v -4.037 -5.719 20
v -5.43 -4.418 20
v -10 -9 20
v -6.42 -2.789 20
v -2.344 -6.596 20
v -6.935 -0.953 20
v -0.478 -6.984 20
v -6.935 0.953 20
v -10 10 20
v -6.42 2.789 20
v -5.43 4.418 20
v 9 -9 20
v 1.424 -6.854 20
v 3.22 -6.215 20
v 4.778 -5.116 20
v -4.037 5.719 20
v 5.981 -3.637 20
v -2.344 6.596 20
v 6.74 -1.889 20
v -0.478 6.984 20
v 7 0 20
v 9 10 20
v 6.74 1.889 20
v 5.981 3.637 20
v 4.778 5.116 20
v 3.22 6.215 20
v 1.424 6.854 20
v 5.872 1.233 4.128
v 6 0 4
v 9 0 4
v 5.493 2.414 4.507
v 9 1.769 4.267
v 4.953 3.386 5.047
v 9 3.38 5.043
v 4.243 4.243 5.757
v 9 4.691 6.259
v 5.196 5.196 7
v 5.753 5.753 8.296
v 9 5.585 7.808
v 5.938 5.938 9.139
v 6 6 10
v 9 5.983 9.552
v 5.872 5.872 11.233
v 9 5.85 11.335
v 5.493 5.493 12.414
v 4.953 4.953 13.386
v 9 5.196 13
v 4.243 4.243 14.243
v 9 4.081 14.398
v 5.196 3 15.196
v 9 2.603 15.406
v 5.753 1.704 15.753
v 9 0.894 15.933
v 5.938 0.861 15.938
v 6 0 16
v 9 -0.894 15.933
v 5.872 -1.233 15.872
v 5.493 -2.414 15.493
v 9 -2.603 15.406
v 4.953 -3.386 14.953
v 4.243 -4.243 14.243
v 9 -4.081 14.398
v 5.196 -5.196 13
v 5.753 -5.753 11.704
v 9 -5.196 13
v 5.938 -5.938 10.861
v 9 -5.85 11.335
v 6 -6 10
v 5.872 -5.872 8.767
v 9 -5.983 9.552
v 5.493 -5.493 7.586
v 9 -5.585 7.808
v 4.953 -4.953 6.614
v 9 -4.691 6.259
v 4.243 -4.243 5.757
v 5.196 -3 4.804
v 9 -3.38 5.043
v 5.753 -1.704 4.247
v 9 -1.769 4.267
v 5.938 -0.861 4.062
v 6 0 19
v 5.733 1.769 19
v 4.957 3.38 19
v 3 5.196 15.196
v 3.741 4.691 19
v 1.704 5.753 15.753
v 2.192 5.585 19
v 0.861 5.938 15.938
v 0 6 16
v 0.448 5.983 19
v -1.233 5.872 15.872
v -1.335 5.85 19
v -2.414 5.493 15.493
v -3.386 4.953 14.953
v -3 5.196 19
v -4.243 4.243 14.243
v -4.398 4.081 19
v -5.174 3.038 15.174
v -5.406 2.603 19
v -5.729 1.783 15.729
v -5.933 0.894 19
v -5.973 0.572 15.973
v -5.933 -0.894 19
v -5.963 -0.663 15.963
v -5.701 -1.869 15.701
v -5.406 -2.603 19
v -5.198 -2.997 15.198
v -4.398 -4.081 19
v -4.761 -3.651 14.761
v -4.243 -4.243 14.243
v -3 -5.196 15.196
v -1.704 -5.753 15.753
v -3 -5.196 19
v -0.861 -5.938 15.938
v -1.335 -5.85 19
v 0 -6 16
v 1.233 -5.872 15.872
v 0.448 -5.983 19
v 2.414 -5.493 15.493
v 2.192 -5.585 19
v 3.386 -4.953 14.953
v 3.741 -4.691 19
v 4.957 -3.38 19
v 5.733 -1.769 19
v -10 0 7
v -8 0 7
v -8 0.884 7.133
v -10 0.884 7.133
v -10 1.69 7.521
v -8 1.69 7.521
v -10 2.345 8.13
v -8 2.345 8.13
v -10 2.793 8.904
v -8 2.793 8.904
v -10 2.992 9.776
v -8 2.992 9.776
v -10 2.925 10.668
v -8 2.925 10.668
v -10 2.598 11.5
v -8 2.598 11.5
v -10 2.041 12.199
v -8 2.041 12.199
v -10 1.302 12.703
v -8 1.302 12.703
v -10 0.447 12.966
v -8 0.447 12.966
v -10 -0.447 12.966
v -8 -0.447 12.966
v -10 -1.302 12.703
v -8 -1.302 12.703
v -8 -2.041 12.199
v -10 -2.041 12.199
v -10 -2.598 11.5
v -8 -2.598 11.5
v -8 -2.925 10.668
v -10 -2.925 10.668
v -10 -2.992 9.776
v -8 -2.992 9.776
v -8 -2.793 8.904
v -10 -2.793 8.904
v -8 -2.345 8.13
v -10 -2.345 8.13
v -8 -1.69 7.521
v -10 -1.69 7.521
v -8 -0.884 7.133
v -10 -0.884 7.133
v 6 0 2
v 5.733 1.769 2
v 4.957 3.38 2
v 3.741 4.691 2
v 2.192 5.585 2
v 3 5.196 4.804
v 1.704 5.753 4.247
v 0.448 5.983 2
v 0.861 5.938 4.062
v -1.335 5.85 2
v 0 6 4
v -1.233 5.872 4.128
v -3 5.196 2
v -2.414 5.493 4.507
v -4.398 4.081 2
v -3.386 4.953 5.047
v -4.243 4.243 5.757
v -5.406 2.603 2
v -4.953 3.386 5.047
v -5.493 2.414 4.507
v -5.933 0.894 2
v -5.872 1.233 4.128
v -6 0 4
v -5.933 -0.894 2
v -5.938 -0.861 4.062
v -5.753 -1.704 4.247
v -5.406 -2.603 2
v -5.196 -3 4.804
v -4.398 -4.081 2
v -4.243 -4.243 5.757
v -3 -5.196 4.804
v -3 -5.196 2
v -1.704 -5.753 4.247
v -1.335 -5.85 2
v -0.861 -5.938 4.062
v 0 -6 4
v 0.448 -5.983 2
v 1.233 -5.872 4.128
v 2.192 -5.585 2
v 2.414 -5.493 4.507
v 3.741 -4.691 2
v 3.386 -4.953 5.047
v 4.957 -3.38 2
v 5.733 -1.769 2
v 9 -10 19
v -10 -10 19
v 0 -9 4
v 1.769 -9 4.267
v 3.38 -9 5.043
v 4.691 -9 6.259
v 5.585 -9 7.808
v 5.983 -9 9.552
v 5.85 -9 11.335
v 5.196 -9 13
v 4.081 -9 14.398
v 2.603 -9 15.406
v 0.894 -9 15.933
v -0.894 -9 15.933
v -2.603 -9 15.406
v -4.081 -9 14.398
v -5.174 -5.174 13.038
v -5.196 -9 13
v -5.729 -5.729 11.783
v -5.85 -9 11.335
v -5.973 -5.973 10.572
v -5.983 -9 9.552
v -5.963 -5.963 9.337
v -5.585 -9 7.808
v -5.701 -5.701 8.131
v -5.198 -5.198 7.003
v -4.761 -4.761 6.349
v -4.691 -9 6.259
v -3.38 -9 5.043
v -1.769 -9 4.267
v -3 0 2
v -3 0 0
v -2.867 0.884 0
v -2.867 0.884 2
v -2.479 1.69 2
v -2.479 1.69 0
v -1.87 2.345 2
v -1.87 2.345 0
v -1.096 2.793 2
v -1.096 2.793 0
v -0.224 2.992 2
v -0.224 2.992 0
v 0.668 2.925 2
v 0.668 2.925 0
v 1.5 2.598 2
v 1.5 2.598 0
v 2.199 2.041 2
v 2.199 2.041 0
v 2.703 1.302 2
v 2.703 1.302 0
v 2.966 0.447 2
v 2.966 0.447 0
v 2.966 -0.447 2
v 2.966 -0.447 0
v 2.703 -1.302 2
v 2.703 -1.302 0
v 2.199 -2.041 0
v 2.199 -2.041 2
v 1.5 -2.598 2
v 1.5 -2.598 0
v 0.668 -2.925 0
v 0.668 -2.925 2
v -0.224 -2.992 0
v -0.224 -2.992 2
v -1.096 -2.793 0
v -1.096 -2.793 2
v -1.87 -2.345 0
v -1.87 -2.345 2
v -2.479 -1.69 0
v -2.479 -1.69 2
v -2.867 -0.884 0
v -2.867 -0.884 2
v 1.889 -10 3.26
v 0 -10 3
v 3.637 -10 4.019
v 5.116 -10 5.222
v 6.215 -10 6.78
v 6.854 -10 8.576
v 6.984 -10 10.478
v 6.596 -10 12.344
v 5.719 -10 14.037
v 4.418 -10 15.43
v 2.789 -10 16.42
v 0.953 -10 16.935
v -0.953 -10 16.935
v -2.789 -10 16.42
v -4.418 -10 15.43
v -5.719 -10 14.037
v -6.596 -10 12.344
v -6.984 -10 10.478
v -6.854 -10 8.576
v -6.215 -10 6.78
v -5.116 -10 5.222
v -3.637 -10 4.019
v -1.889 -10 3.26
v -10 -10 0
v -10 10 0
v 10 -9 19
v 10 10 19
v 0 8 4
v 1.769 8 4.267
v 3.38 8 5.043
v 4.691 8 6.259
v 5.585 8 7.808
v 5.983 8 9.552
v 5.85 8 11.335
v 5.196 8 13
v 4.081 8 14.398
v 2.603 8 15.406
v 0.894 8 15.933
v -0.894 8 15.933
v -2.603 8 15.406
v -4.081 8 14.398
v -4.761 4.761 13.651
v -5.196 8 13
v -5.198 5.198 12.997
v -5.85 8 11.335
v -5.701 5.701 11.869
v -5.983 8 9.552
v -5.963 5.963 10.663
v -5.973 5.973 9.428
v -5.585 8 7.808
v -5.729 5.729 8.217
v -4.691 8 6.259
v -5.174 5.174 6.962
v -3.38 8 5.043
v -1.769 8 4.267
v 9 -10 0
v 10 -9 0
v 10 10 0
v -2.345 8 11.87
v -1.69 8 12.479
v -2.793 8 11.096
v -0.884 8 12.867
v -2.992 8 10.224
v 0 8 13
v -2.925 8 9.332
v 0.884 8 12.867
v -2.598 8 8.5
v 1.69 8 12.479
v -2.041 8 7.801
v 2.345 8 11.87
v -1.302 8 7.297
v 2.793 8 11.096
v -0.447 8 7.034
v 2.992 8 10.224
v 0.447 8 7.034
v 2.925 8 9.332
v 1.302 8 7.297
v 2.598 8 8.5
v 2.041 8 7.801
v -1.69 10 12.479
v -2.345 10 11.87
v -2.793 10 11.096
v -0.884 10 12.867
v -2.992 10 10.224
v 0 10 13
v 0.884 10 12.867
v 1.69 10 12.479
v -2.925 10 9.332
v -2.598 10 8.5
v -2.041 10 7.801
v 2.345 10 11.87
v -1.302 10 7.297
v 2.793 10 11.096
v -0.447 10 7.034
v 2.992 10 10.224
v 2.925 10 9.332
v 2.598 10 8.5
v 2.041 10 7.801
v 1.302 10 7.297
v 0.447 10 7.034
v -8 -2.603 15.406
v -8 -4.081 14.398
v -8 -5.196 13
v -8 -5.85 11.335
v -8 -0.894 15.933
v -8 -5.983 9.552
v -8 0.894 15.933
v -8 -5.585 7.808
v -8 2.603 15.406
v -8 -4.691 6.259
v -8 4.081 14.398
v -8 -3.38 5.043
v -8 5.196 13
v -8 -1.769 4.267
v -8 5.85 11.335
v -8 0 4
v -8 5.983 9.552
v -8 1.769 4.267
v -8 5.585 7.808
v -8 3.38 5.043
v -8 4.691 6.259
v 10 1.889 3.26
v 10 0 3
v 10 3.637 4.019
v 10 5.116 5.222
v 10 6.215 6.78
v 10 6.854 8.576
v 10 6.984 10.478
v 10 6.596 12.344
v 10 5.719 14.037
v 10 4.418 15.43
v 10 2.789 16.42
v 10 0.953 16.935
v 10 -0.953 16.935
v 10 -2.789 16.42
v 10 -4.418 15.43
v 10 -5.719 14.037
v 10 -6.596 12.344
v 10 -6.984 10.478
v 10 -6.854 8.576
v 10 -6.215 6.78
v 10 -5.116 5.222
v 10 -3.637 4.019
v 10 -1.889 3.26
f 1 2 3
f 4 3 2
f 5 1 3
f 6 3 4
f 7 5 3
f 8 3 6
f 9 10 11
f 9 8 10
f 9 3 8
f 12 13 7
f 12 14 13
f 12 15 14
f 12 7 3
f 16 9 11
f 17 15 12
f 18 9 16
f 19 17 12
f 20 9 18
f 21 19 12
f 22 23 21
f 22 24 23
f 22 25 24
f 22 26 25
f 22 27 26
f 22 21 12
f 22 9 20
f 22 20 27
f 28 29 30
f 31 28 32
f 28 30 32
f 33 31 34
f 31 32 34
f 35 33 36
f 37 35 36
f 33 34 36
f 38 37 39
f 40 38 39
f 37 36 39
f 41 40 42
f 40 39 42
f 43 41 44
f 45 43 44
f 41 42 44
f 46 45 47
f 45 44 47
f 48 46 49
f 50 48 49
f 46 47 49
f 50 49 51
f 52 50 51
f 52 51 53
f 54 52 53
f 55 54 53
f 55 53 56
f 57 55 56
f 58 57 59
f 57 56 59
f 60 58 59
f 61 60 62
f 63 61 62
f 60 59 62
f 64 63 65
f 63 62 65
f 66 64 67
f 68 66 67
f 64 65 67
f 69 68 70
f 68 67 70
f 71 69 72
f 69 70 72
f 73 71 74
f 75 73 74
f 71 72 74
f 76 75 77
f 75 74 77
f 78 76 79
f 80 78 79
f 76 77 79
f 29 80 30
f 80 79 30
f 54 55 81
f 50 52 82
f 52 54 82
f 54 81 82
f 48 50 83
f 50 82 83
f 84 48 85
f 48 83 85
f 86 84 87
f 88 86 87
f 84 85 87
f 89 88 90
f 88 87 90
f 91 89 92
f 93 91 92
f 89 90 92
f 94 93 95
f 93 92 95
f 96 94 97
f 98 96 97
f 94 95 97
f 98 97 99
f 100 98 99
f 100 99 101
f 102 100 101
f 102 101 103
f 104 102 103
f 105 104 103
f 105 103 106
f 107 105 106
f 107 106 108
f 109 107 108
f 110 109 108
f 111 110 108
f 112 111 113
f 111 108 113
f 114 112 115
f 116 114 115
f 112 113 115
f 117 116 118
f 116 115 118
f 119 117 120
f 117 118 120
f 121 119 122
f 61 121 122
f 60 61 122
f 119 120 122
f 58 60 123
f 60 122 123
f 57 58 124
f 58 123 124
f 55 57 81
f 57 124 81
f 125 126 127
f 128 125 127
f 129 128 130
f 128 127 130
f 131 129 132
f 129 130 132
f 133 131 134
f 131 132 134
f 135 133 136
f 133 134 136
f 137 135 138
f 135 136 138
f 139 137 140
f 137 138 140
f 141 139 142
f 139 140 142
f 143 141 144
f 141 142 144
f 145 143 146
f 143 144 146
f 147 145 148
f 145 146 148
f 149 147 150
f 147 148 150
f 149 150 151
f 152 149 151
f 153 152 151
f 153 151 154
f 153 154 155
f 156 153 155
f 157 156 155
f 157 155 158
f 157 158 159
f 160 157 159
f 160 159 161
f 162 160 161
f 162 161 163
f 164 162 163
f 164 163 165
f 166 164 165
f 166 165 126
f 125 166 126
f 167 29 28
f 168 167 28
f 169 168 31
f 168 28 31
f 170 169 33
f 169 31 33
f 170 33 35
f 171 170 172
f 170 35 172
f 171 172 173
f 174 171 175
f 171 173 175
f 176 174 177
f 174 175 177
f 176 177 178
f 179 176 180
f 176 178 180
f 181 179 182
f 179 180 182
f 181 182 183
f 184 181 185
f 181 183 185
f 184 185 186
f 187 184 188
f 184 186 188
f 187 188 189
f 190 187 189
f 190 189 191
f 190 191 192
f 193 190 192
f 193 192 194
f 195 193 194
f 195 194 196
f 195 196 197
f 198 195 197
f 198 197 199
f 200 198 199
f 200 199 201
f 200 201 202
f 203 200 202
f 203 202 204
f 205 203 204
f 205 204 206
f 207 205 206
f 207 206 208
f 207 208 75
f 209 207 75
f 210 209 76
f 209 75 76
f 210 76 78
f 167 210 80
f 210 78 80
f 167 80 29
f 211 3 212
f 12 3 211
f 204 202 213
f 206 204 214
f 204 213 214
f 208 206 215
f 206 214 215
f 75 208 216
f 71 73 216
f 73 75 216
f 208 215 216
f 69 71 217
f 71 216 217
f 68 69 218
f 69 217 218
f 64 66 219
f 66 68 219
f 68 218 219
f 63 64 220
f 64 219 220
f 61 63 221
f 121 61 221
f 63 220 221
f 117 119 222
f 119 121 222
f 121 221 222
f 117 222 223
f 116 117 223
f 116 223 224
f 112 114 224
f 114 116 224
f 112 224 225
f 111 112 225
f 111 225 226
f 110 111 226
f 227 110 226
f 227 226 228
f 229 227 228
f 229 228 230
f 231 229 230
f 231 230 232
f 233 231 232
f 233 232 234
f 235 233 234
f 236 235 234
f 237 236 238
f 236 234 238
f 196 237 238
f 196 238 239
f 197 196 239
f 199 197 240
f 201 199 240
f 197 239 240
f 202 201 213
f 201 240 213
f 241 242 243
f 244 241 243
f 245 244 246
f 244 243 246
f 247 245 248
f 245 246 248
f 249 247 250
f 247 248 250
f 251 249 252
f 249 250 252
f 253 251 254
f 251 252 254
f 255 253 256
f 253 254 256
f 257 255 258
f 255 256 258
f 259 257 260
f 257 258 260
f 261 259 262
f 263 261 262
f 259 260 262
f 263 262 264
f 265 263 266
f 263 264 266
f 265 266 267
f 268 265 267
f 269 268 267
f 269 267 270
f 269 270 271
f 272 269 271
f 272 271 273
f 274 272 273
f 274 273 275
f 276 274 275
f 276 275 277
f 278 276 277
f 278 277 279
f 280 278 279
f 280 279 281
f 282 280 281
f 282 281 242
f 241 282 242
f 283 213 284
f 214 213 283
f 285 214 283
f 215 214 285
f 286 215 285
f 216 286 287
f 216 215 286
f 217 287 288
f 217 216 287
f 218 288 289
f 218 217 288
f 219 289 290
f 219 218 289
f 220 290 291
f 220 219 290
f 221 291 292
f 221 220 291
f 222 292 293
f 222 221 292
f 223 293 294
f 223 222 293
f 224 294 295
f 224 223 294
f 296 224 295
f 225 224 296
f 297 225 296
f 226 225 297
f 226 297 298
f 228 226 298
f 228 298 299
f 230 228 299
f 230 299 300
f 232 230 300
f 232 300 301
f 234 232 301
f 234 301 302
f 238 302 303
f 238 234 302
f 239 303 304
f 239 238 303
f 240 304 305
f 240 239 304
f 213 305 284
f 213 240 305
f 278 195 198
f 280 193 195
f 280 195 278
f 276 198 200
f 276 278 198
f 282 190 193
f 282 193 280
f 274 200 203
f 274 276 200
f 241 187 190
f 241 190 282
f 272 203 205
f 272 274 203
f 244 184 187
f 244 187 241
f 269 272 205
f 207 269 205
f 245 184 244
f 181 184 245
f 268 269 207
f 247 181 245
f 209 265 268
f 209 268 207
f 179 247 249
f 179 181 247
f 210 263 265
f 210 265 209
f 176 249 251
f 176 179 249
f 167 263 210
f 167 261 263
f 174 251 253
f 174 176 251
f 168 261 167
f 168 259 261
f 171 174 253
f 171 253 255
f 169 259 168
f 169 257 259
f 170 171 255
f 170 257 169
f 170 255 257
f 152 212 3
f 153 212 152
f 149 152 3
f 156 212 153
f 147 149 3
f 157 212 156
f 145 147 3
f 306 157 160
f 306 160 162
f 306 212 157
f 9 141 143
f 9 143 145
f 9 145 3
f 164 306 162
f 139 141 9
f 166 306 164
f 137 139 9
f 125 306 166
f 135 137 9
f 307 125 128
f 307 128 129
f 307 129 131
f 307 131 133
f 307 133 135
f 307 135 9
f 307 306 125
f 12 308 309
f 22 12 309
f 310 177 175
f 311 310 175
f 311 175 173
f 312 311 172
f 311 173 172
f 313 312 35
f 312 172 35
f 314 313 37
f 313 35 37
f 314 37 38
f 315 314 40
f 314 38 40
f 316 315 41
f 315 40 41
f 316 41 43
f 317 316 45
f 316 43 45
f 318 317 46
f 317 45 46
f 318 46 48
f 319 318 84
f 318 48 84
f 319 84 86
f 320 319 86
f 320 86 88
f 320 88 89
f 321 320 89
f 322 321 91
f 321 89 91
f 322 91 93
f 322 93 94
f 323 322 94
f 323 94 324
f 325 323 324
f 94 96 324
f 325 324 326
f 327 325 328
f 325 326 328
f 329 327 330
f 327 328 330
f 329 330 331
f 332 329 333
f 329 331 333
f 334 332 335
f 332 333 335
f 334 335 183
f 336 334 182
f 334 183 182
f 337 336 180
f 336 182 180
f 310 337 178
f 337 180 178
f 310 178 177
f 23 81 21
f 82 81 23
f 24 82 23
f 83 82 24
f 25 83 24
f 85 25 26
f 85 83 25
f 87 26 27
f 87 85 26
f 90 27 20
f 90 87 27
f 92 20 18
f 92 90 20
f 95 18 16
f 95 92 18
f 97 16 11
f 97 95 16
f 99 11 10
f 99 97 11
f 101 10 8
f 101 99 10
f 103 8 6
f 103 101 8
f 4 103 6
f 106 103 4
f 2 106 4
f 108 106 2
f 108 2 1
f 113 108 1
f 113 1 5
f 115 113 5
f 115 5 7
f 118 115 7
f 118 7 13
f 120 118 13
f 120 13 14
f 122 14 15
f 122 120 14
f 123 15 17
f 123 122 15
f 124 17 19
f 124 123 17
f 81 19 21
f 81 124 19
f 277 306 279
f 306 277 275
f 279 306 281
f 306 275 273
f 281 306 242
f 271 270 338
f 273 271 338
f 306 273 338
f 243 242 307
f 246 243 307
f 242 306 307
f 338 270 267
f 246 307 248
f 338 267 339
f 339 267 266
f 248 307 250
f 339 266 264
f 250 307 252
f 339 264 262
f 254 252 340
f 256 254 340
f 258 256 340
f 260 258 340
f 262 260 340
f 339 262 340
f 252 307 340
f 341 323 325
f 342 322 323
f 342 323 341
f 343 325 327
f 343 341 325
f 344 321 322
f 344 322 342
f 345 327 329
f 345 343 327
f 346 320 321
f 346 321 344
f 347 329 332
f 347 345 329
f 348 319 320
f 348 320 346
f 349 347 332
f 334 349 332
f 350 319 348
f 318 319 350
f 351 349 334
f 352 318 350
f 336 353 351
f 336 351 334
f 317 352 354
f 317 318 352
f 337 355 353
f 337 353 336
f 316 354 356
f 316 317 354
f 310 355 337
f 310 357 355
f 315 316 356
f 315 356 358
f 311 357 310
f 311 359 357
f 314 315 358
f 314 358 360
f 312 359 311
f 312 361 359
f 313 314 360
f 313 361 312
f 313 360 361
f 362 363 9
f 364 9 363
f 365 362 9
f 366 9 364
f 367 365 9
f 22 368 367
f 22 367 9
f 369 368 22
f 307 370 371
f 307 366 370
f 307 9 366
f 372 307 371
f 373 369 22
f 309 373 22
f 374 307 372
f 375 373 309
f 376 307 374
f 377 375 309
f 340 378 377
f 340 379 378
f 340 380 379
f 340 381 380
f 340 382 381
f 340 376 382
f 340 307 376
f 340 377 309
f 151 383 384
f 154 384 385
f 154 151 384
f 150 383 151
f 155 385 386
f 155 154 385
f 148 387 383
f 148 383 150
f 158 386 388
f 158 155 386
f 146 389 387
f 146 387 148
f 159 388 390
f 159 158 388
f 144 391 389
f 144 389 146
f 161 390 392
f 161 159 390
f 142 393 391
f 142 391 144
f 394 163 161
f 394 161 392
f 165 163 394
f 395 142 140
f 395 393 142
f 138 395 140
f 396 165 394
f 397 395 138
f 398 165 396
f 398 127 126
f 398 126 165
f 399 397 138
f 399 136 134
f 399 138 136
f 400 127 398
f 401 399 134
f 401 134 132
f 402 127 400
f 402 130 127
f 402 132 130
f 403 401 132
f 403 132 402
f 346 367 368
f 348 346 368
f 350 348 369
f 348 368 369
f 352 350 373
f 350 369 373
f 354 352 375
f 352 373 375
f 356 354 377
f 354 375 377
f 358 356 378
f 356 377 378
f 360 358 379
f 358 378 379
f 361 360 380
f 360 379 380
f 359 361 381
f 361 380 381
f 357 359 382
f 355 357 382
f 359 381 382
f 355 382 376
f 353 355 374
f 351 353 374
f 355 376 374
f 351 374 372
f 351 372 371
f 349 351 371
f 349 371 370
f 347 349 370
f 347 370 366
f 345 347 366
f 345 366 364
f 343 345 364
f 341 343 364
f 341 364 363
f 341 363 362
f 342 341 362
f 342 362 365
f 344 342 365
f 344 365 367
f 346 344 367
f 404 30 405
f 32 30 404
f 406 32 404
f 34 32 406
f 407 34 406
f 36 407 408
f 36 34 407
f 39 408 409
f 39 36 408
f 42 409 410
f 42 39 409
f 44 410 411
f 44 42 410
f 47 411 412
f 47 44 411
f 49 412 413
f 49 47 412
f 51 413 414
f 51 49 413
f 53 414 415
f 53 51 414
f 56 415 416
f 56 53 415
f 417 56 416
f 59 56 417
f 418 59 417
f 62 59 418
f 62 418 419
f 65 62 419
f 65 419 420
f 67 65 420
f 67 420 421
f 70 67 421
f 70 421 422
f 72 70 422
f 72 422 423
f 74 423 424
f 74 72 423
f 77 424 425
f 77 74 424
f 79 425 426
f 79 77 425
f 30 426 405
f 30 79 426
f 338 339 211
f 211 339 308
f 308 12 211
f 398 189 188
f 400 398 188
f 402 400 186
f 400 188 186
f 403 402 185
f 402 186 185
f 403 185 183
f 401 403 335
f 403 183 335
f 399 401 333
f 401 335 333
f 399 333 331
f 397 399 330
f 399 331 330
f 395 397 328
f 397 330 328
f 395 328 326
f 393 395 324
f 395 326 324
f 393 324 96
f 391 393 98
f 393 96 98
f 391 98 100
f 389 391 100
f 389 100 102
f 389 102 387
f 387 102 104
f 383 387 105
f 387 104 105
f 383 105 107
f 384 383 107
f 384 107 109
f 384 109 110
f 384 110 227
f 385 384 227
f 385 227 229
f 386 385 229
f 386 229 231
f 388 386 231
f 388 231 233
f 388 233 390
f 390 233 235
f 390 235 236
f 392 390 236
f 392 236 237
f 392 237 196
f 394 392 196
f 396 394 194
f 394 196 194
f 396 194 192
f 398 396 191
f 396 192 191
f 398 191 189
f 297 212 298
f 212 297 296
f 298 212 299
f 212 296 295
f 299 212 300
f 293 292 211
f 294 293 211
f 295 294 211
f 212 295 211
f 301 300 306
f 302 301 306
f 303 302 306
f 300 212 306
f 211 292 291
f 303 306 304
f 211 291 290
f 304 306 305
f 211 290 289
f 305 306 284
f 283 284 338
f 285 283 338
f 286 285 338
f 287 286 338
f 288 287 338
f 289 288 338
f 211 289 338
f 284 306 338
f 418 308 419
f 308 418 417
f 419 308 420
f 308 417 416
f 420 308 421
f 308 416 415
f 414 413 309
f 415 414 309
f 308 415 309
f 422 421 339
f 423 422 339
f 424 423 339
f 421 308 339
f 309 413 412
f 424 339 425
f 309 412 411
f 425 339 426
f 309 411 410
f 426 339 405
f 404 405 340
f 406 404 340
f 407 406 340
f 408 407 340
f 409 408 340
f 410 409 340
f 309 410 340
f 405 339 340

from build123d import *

# Parameters (mm, degrees)
SKETCH_1_W          = 20
SKETCH_1_H          = 20
EXTRUDE_1_DEPTH     = 20
SKETCH_2_R          = 3
CUT_EXTRUDE_1_DEPTH = 20
CUT_EXTRUDE_2_REACH = 32
SKETCH_3_R          = 3
CUT_EXTRUDE_3_REACH = 32
SKETCH_4_R          = 3
SKETCH_5_R          = 6
CUT_EXTRUDE_4_DEPTH = 18
SKETCH_6_R          = 6
CUT_EXTRUDE_5_DEPTH = 18
SKETCH_7_R          = 6
CUT_EXTRUDE_6_DEPTH = 18
CHAMFER_1_SIZE      = 1
CHAMFER_2_SIZE      = 1


with BuildPart() as part:
    # 草图1 → 凸台-拉伸1 (new body)
    with BuildSketch(Plane.XY):
        Rectangle(SKETCH_1_W, SKETCH_1_H)
    extrude(amount=EXTRUDE_1_DEPTH)

    # 草图2 → 切除-拉伸1 (cut)
    with BuildSketch(Plane(origin=(0, 0, 0), x_dir=(-1, 0, 0), z_dir=(0, 0, -1))):
        Circle(SKETCH_2_R)
    extrude(amount=-CUT_EXTRUDE_1_DEPTH, mode=Mode.SUBTRACT)

    # 切除-拉伸2: up to this face of the body (flat: up to its plane)
    cut_extrude_2_end = Plane(part.part.faces().sort_by_distance((-10, 0, 10))[0])
    # 草图3 → 切除-拉伸2 (cut, up to the picked face)
    with BuildSketch(Plane(origin=(10, 0, 0), x_dir=(0, 0, -1), z_dir=(1, 0, 0)), mode=Mode.PRIVATE) as cut_extrude_2_sk1:
        with Locations((-10, 0)):
            Circle(SKETCH_3_R)
    cut_extrude_2_tool1 = split(extrude(cut_extrude_2_sk1.sketch, amount=-CUT_EXTRUDE_2_REACH, mode=Mode.PRIVATE), bisect_by=cut_extrude_2_end, keep=Keep.BOTH, mode=Mode.PRIVATE)
    add(cut_extrude_2_tool1.solids().sort_by(Axis((10, 0, 10), (-1, 0, 0)))[0], mode=Mode.SUBTRACT)

    # 切除-拉伸3: up to this face of the body (flat: up to its plane)
    cut_extrude_3_end = Plane(part.part.faces().sort_by_distance((0, -10, 10))[0])
    # 草图4 → 切除-拉伸3 (cut, up to the picked face)
    with BuildSketch(Plane(origin=(0, 10, 0), x_dir=(1, 0, 0), z_dir=(0, 1, 0)), mode=Mode.PRIVATE) as cut_extrude_3_sk1:
        with Locations(Location((0, -10, 0), (0, 0, 270))):
            Circle(SKETCH_4_R)
    cut_extrude_3_tool1 = split(extrude(cut_extrude_3_sk1.sketch, amount=-CUT_EXTRUDE_3_REACH, mode=Mode.PRIVATE), bisect_by=cut_extrude_3_end, keep=Keep.BOTH, mode=Mode.PRIVATE)
    add(cut_extrude_3_tool1.solids().sort_by(Axis((0, 10, 10), (0, -1, 0)))[0], mode=Mode.SUBTRACT)

    # 草图5 → 切除-拉伸4 (cut)
    with BuildSketch(Plane(origin=(10, 0, 0), x_dir=(0, 0, -1), z_dir=(1, 0, 0))):
        with Locations((-10, 0)):
            Circle(SKETCH_5_R)
    extrude(amount=-CUT_EXTRUDE_4_DEPTH, mode=Mode.SUBTRACT)

    # 草图6 → 切除-拉伸5 (cut)
    with BuildSketch(Plane.XY.offset(20)):
        Circle(SKETCH_6_R)
    extrude(amount=-CUT_EXTRUDE_5_DEPTH, mode=Mode.SUBTRACT)

    # 草图7 → 切除-拉伸6 (cut)
    with BuildSketch(Plane.XZ.offset(10)):
        with Locations(Location((0, 10, 0), (0, 0, 270))):
            Circle(SKETCH_7_R)
    extrude(amount=-CUT_EXTRUDE_6_DEPTH, mode=Mode.SUBTRACT)

    # 倒角1
    chamfer_1_edges = [part.edges().sort_by_distance(p)[0] for p in [
        (0, -10, 20),
        (10, 0, 20),
        (10, -10, 10),
    ]]
    chamfer(chamfer_1_edges, length=CHAMFER_1_SIZE)

    # 倒角2
    chamfer_2_edges = [part.edges().sort_by_distance(p)[0] for p in [
        (10, 0, 16),
        (-6, 0, 20),
        (0, -10, 16),
    ]]
    chamfer(chamfer_2_edges, length=CHAMFER_2_SIZE)


solid = part.part
